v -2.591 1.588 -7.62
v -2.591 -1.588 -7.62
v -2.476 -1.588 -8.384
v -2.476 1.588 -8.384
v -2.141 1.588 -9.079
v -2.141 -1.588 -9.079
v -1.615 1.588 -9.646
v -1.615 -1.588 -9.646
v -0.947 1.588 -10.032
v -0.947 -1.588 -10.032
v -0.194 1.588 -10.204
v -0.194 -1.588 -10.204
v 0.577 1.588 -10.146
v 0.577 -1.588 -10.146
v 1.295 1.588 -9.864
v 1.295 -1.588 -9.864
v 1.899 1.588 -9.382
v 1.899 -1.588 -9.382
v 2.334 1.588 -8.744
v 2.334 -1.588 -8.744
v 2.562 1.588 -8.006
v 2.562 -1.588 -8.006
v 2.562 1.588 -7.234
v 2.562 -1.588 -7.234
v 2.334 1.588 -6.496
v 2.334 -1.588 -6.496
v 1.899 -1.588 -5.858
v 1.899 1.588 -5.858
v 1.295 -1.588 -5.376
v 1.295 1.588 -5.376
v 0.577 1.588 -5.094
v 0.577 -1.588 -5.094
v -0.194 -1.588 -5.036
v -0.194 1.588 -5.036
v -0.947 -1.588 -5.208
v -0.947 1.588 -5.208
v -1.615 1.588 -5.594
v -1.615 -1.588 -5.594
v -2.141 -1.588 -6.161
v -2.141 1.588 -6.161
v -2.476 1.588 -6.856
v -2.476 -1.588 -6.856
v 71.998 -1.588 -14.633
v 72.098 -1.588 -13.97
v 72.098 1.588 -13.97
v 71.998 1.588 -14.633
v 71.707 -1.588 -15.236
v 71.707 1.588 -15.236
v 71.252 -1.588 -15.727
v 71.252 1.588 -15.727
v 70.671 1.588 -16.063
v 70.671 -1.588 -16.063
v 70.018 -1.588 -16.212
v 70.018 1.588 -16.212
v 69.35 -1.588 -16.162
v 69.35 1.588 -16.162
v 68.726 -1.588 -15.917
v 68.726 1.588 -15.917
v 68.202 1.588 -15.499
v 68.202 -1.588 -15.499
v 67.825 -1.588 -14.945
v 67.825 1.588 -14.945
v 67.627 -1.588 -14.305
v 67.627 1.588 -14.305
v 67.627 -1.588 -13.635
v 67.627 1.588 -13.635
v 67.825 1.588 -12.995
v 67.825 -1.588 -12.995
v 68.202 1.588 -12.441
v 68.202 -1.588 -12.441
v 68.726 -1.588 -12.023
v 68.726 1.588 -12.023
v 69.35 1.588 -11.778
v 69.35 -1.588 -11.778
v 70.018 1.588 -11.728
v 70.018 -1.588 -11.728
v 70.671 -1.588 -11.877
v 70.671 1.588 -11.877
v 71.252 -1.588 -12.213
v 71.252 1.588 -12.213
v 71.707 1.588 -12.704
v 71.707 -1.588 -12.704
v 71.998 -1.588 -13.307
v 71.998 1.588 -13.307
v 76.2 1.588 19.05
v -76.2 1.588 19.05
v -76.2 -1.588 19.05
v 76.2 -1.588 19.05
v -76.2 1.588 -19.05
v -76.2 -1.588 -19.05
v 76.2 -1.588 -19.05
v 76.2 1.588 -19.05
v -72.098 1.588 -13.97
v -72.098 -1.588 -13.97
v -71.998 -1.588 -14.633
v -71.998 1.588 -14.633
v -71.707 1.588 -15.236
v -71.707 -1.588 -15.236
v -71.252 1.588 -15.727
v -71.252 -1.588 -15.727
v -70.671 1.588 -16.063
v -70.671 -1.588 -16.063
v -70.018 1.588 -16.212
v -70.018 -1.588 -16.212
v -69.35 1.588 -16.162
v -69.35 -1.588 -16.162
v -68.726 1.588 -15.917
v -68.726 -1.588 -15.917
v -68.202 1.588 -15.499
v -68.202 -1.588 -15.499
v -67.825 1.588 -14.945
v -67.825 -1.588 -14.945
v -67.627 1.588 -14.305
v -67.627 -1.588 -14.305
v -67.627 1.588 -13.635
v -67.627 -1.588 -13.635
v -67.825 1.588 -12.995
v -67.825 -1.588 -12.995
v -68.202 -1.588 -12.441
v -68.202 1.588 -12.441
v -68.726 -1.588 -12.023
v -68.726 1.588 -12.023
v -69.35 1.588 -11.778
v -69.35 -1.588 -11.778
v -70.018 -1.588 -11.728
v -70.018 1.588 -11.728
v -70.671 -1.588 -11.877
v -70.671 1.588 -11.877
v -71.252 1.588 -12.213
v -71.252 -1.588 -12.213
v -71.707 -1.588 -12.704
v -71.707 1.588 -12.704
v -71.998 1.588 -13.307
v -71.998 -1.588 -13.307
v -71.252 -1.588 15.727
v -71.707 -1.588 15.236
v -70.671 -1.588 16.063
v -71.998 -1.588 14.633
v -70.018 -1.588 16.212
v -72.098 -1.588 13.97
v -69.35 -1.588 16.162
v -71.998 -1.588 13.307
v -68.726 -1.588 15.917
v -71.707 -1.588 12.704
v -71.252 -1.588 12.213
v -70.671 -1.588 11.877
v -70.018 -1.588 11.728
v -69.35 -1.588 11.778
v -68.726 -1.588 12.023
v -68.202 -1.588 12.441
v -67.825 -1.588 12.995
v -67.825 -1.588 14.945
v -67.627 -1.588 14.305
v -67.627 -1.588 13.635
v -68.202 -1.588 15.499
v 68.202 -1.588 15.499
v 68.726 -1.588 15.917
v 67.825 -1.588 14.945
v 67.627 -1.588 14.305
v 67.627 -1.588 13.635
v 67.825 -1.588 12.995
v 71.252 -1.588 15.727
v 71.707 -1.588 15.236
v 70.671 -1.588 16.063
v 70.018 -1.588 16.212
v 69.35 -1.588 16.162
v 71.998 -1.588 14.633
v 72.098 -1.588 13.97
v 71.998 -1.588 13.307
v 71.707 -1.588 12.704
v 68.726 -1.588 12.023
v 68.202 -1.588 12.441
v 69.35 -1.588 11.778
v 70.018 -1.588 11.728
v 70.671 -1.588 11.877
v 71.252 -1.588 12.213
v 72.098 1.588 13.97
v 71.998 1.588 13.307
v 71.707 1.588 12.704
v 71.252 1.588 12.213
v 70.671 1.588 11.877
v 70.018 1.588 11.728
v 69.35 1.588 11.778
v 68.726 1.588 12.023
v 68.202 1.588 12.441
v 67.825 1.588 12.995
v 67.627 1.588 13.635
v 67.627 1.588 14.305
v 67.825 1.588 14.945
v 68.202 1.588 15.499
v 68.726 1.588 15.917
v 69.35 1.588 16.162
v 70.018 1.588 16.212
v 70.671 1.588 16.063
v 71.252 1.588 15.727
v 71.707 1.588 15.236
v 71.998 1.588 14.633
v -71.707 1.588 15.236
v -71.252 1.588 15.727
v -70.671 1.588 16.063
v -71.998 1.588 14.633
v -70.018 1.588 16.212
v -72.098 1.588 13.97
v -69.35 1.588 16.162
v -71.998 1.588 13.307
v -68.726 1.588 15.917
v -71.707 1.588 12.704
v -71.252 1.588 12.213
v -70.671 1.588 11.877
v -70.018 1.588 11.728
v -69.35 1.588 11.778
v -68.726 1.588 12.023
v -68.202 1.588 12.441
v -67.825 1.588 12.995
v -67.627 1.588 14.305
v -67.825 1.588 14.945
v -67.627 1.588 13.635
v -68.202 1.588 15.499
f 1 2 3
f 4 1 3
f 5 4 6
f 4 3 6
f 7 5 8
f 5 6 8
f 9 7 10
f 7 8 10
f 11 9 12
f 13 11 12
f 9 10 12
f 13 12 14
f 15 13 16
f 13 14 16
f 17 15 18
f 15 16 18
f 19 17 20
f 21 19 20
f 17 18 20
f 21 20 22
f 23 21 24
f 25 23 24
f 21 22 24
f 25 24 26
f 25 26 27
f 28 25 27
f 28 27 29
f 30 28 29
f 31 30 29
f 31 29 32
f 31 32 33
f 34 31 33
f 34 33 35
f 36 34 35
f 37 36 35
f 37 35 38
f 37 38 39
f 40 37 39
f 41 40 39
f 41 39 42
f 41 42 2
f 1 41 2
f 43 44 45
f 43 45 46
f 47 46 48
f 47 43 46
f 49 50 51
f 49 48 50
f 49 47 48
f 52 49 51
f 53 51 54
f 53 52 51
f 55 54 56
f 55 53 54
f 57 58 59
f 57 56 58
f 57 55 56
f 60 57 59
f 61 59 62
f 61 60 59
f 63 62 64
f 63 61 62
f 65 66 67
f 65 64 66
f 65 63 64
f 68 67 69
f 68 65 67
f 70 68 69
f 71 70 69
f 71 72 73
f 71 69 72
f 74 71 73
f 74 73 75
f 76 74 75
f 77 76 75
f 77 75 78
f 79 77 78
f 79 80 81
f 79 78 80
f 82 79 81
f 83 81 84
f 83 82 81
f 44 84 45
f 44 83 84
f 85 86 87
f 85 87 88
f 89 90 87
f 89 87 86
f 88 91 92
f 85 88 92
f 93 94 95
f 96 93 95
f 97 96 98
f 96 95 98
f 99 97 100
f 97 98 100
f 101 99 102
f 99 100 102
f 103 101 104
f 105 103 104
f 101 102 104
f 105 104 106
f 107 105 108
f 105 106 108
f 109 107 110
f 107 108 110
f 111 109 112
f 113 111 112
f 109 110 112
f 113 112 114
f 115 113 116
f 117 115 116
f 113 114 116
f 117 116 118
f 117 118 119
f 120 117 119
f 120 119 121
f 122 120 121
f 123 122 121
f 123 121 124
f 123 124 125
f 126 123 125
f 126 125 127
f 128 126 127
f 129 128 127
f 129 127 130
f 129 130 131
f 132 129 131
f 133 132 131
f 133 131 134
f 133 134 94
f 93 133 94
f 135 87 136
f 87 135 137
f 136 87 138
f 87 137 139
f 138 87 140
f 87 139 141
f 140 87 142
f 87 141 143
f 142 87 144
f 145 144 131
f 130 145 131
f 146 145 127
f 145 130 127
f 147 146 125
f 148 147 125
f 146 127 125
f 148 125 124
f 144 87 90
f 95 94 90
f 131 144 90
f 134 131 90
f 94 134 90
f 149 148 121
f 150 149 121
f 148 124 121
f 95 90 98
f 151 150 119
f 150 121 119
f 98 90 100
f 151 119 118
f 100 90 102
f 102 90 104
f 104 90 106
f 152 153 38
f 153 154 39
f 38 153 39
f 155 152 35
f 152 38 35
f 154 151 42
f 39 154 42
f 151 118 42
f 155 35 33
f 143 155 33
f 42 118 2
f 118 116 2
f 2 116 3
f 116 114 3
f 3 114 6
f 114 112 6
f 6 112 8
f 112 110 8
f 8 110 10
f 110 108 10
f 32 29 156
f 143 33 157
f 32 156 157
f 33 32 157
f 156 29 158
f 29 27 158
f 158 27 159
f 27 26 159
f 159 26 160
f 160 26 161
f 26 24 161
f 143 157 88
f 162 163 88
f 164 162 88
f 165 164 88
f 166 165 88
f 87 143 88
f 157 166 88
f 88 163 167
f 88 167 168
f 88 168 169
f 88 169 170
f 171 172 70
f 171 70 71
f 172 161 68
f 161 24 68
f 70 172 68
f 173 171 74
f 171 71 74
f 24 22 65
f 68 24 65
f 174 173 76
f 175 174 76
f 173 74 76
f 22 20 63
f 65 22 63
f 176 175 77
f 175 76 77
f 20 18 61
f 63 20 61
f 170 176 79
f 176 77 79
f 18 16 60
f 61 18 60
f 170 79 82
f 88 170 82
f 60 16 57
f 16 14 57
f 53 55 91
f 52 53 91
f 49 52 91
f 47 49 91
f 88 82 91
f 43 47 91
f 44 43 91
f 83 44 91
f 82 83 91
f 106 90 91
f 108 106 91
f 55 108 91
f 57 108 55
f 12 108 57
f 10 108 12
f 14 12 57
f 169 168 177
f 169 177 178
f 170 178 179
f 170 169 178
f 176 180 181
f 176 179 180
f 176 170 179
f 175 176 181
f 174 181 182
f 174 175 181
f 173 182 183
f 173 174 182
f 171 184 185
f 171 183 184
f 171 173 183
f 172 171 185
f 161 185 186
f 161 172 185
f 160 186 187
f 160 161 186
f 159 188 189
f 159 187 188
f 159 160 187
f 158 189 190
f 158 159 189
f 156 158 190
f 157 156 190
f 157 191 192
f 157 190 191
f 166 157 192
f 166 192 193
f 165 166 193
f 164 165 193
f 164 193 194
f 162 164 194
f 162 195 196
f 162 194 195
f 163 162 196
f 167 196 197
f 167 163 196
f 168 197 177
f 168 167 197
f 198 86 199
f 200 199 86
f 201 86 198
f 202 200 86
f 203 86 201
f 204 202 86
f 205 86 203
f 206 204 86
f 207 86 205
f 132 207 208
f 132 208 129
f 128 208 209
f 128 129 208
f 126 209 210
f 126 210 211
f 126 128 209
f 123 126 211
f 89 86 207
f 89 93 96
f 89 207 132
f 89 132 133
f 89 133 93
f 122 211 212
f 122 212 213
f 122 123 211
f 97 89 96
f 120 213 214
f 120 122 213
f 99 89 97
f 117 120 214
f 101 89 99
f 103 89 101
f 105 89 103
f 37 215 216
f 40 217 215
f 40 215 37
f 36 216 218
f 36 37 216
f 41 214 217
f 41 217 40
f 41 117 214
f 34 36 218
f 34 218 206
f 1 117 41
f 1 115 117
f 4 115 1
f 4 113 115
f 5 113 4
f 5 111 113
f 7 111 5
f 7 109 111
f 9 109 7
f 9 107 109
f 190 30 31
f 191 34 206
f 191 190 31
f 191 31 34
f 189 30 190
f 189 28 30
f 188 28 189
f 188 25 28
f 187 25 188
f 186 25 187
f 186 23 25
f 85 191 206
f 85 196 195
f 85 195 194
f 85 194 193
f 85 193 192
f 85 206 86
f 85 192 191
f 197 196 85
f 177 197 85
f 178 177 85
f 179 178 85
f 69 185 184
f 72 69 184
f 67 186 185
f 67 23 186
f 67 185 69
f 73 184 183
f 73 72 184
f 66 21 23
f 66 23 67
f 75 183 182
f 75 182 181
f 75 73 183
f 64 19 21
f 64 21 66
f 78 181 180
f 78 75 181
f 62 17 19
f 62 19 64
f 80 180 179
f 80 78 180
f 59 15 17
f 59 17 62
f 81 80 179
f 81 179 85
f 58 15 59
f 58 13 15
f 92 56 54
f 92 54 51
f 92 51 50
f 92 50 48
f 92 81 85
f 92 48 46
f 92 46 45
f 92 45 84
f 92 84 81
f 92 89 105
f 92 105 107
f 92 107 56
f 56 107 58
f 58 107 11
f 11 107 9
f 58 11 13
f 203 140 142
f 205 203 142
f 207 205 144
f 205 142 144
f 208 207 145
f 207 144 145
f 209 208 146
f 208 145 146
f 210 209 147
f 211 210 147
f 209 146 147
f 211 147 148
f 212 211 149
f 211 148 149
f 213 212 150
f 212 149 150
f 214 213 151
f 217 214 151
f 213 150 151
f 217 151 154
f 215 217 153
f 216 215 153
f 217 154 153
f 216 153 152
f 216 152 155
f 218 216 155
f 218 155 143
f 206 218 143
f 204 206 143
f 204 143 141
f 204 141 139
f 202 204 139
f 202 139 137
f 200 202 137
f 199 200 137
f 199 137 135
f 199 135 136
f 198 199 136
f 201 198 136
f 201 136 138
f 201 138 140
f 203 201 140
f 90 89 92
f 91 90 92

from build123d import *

# Parameters (mm, degrees)
BOSS_EXTRUDE1_DEPTH        = 19.05
BOSS_EXTRUDE1_DEPTH_BACK   = 19.05
SKETCH3_W                  = 152.4
SKETCH3_H                  = 3.175
F_8_CLEARANCE_HOLE1_D      = 4.4958
F_6_0_204_DIAMETER_HOLE1_D = 5.1816


with BuildPart() as part:
    # Sketch3 → Boss-Extrude1 (new, two sides: drawn at the far end of the back side and taken through both)
    with BuildSketch(Plane.XY.offset(-BOSS_EXTRUDE1_DEPTH_BACK)):
        Rectangle(SKETCH3_W, SKETCH3_H)
    extrude(amount=BOSS_EXTRUDE1_DEPTH + BOSS_EXTRUDE1_DEPTH_BACK)

    # #8 Clearance Hole1 (through all)
    with Locations(Plane(origin=(0, 1.5875, 0), x_dir=(1, 0, 0), z_dir=(0, 1, 0))):
        with Locations((-69.85, 13.97), (-69.85, -13.97)):
            f_8_clearance_hole1 = Hole(F_8_CLEARANCE_HOLE1_D / 2)

    # Mirror1: #8 Clearance Hole1 across plane
    add(f_8_clearance_hole1.mirror(Plane(origin=(0, 0, 0), x_dir=(0, 0, 1), z_dir=(1, 0, 0))), mode=Mode.SUBTRACT)

    # #6 (0.204) Diameter Hole1 (through all)
    with Locations(Plane(origin=(0, 1.5875, 0), x_dir=(1, 0, 0), z_dir=(0, 1, 0))):
        with Locations((0, 7.62)):
            Hole(F_6_0_204_DIAMETER_HOLE1_D / 2)


solid = part.part
